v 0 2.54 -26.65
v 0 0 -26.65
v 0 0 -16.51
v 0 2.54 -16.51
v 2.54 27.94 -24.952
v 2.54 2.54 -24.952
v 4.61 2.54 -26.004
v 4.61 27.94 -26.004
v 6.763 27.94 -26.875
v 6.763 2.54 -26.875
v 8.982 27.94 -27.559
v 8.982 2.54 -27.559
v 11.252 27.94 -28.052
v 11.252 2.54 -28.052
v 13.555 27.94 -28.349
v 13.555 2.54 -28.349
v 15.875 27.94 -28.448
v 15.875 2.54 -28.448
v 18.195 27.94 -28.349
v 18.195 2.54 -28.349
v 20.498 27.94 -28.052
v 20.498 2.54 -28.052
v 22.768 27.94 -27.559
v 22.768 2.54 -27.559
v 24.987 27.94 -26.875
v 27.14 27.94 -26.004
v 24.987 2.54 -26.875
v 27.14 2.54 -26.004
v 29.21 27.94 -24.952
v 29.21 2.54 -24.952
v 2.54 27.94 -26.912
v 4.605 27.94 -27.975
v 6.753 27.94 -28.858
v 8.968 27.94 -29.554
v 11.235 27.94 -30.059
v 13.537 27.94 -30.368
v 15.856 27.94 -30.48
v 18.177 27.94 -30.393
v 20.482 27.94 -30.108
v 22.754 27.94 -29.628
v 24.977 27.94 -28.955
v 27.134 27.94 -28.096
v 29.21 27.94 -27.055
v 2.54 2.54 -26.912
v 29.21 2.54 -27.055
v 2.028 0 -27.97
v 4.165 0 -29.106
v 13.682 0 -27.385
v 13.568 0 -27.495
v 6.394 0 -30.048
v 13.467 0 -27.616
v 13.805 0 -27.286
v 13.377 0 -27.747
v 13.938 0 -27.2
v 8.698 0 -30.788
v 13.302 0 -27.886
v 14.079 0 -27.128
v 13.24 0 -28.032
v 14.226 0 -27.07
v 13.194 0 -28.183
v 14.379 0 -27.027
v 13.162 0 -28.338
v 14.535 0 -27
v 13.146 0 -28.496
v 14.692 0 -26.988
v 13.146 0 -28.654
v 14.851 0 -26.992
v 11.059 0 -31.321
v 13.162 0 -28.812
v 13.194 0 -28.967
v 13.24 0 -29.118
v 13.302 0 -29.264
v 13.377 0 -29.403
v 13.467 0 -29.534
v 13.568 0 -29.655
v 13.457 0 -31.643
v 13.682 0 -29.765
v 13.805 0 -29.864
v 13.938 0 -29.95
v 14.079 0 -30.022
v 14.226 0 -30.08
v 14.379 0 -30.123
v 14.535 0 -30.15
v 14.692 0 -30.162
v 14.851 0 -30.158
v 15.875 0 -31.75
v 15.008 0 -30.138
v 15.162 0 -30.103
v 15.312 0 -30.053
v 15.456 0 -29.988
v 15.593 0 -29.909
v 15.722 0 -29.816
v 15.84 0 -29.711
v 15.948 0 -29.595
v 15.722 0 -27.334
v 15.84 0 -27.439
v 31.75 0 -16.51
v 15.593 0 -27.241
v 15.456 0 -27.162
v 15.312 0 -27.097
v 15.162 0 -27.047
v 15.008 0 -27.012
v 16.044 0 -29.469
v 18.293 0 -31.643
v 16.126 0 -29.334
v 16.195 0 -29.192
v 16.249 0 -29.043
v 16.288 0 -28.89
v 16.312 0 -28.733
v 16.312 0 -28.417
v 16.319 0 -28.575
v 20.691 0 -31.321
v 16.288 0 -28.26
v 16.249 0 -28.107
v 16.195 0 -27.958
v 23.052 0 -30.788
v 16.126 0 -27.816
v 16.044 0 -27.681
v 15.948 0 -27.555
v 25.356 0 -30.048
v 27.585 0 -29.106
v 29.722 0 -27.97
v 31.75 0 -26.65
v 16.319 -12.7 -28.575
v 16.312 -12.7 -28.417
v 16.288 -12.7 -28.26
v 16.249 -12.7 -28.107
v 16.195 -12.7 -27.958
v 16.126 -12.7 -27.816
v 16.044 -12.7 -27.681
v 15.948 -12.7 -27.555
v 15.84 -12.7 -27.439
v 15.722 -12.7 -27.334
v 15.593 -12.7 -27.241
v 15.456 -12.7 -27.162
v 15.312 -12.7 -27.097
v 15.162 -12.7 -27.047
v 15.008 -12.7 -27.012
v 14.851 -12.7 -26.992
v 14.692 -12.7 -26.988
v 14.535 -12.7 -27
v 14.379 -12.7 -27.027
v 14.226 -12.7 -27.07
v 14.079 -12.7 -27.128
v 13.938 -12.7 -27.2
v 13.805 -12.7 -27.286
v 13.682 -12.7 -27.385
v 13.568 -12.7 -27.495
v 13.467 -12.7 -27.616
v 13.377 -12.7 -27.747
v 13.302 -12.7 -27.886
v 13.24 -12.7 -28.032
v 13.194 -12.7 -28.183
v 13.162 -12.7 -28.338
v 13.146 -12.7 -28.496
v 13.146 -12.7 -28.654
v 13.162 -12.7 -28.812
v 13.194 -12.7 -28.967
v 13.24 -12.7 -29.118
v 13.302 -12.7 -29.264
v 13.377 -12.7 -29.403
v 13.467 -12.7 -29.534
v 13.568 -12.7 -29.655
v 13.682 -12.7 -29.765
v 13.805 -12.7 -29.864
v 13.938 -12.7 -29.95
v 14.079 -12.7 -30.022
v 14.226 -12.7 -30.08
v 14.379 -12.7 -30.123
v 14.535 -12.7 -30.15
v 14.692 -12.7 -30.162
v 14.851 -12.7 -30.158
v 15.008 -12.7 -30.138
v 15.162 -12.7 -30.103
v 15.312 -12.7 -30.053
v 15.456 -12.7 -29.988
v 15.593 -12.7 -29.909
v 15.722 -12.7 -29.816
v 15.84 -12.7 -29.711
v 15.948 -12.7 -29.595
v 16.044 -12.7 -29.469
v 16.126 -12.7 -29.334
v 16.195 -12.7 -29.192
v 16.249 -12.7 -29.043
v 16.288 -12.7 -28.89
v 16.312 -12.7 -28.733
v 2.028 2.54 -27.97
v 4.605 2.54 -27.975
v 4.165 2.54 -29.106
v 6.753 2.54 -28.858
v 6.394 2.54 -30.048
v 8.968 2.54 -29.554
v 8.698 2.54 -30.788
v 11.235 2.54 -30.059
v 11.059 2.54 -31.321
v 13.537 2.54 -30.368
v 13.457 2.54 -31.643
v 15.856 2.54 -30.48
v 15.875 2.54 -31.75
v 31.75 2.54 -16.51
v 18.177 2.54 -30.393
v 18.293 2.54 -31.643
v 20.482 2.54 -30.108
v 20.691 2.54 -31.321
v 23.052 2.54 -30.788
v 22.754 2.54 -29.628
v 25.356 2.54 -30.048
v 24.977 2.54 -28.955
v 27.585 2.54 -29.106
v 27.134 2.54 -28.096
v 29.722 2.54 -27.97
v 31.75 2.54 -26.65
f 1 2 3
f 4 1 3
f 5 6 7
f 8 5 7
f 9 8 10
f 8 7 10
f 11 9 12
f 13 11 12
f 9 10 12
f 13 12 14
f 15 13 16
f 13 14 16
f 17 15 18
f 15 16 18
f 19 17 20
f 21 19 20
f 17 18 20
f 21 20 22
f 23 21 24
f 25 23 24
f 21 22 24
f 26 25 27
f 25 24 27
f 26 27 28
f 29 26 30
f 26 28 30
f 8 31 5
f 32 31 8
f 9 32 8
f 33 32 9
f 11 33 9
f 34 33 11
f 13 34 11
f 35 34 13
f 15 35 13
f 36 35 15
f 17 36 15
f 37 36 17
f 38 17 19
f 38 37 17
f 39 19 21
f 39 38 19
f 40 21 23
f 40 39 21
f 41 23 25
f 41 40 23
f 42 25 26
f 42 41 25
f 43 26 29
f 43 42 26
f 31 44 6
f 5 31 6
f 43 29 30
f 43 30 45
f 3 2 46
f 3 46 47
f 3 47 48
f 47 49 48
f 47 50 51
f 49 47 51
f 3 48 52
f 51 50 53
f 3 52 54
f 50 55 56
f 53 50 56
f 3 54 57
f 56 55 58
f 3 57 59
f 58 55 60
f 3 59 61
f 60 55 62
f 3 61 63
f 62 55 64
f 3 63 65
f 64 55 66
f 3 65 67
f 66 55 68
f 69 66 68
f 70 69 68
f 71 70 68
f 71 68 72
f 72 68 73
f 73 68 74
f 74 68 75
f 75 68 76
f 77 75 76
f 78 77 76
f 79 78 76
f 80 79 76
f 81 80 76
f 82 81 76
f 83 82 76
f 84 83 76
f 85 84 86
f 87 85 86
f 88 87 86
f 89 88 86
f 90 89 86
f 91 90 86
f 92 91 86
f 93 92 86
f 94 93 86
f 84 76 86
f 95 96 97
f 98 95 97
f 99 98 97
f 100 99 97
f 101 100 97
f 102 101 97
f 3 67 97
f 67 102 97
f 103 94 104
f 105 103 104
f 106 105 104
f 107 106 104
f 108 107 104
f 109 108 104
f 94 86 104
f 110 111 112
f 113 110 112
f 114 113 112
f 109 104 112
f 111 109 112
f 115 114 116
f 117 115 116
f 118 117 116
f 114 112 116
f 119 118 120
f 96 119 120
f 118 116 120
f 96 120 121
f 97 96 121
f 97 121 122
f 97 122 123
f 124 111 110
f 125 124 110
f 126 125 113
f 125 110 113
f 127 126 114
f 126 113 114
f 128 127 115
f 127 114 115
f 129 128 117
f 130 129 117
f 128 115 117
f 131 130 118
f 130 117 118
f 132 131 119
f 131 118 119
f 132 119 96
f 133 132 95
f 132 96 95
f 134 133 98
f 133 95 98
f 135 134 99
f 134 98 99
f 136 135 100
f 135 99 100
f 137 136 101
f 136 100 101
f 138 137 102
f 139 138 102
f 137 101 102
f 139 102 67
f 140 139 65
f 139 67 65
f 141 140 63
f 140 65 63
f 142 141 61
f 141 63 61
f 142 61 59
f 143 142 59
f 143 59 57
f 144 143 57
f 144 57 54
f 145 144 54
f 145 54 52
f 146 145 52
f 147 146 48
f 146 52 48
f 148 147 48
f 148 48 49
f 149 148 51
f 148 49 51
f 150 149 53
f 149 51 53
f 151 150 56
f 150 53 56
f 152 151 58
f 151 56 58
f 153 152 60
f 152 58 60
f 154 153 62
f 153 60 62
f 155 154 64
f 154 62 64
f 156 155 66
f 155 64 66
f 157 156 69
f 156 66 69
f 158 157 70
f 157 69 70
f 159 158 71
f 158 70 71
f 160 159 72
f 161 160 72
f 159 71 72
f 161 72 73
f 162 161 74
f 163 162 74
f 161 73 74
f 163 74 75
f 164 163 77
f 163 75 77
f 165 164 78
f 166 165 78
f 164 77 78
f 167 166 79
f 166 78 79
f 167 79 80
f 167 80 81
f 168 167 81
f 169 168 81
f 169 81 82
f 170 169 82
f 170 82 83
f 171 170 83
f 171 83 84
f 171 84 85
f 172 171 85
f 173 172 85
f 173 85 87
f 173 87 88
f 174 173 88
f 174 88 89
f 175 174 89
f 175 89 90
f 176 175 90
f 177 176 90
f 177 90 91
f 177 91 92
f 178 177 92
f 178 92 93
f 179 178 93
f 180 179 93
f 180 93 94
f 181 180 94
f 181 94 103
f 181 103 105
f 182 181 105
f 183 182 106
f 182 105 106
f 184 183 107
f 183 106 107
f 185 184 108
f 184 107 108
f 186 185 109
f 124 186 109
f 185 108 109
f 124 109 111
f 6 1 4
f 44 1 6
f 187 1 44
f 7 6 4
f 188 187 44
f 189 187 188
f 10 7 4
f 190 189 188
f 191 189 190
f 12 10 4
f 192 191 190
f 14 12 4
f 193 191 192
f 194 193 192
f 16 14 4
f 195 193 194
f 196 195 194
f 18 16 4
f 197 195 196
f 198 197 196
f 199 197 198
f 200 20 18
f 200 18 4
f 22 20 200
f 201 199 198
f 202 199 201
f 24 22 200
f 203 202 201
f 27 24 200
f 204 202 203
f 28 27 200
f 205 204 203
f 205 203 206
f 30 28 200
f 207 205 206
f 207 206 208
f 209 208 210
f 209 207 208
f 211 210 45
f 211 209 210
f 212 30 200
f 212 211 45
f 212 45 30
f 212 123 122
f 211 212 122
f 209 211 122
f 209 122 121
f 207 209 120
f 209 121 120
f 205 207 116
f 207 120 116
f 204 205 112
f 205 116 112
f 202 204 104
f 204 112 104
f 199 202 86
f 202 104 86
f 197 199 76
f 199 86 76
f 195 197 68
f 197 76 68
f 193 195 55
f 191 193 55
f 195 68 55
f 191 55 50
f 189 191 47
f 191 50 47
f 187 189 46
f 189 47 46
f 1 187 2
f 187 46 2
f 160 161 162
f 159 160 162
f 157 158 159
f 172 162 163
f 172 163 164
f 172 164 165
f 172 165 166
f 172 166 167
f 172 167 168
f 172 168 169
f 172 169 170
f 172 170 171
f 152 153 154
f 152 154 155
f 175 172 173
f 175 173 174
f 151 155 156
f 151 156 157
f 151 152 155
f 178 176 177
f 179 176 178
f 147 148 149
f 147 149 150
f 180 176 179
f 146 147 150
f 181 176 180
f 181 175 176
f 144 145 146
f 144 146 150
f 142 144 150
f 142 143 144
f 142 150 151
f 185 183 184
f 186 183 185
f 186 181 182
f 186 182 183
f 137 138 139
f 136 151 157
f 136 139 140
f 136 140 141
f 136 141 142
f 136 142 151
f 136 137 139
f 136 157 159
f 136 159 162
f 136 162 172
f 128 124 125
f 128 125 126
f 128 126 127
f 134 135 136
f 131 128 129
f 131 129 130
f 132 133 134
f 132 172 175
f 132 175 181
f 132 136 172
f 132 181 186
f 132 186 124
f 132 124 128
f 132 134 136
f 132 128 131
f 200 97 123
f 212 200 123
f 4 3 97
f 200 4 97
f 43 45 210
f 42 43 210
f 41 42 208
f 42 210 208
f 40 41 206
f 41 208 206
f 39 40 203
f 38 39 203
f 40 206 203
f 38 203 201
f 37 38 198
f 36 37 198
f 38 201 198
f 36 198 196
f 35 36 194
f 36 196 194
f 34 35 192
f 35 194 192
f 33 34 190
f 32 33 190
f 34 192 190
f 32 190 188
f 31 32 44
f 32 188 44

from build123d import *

# Parameters (mm, degrees)
BOSS_EXTRUDE1_DEPTH = 2.54
BOSS_EXTRUDE2_DEPTH = 25.4
SKETCH4_W           = 31.75
SKETCH4_H           = 16.51
CUT_EXTRUDE1_DEPTH  = 2.54
SKETCH5_R           = 1.5875
BOSS_EXTRUDE3_DEPTH = 12.7


with BuildPart() as part:
    # Sketch1 → Boss-Extrude1 (new body)
    with BuildSketch(Plane(origin=(0, 0, 0), x_dir=(1, 0, 0), z_dir=(0, 1, 0))):
        with BuildLine():
            Line((0, 0), (31.75, 0))
            Line((31.75, 0), (31.75, 26.649569904))
            ThreePointArc((31.75, 26.649569904), (15.875, 31.75), (0, 26.649569904))
            Line((0, 26.649569904), (0, 0))
        make_face()
    extrude(amount=BOSS_EXTRUDE1_DEPTH)

    # Sketch2 → Boss-Extrude2 (add)
    with BuildSketch(Plane(origin=(0, 2.54, 0), x_dir=(1, 0, 0), z_dir=(0, 1, 0))):
        with BuildLine():
            Line((2.54, 26.911706478), (2.54, 24.951669261))
            ThreePointArc((2.54, 24.951669261), (15.875, 28.448), (29.21, 24.951669261))
            Line((29.21, 24.951669261), (29.21, 27.054735))
            ThreePointArc((29.21, 27.054735), (15.856249221, 30.479609179), (2.54, 26.911706478))
        make_face()
    extrude(amount=BOSS_EXTRUDE2_DEPTH)

    # Sketch4 → Cut-Extrude1 (cut)
    with BuildSketch(Plane.XZ):
        with Locations((15.875, -8.255)):
            Rectangle(SKETCH4_W, SKETCH4_H)
    extrude(amount=-CUT_EXTRUDE1_DEPTH, mode=Mode.SUBTRACT)

    # Sketch5 → Boss-Extrude3 (add)
    with BuildSketch(Plane.XZ):
        with Locations((14.732, -28.575)):
            Circle(SKETCH5_R)
    extrude(amount=BOSS_EXTRUDE3_DEPTH)


solid = part.part
